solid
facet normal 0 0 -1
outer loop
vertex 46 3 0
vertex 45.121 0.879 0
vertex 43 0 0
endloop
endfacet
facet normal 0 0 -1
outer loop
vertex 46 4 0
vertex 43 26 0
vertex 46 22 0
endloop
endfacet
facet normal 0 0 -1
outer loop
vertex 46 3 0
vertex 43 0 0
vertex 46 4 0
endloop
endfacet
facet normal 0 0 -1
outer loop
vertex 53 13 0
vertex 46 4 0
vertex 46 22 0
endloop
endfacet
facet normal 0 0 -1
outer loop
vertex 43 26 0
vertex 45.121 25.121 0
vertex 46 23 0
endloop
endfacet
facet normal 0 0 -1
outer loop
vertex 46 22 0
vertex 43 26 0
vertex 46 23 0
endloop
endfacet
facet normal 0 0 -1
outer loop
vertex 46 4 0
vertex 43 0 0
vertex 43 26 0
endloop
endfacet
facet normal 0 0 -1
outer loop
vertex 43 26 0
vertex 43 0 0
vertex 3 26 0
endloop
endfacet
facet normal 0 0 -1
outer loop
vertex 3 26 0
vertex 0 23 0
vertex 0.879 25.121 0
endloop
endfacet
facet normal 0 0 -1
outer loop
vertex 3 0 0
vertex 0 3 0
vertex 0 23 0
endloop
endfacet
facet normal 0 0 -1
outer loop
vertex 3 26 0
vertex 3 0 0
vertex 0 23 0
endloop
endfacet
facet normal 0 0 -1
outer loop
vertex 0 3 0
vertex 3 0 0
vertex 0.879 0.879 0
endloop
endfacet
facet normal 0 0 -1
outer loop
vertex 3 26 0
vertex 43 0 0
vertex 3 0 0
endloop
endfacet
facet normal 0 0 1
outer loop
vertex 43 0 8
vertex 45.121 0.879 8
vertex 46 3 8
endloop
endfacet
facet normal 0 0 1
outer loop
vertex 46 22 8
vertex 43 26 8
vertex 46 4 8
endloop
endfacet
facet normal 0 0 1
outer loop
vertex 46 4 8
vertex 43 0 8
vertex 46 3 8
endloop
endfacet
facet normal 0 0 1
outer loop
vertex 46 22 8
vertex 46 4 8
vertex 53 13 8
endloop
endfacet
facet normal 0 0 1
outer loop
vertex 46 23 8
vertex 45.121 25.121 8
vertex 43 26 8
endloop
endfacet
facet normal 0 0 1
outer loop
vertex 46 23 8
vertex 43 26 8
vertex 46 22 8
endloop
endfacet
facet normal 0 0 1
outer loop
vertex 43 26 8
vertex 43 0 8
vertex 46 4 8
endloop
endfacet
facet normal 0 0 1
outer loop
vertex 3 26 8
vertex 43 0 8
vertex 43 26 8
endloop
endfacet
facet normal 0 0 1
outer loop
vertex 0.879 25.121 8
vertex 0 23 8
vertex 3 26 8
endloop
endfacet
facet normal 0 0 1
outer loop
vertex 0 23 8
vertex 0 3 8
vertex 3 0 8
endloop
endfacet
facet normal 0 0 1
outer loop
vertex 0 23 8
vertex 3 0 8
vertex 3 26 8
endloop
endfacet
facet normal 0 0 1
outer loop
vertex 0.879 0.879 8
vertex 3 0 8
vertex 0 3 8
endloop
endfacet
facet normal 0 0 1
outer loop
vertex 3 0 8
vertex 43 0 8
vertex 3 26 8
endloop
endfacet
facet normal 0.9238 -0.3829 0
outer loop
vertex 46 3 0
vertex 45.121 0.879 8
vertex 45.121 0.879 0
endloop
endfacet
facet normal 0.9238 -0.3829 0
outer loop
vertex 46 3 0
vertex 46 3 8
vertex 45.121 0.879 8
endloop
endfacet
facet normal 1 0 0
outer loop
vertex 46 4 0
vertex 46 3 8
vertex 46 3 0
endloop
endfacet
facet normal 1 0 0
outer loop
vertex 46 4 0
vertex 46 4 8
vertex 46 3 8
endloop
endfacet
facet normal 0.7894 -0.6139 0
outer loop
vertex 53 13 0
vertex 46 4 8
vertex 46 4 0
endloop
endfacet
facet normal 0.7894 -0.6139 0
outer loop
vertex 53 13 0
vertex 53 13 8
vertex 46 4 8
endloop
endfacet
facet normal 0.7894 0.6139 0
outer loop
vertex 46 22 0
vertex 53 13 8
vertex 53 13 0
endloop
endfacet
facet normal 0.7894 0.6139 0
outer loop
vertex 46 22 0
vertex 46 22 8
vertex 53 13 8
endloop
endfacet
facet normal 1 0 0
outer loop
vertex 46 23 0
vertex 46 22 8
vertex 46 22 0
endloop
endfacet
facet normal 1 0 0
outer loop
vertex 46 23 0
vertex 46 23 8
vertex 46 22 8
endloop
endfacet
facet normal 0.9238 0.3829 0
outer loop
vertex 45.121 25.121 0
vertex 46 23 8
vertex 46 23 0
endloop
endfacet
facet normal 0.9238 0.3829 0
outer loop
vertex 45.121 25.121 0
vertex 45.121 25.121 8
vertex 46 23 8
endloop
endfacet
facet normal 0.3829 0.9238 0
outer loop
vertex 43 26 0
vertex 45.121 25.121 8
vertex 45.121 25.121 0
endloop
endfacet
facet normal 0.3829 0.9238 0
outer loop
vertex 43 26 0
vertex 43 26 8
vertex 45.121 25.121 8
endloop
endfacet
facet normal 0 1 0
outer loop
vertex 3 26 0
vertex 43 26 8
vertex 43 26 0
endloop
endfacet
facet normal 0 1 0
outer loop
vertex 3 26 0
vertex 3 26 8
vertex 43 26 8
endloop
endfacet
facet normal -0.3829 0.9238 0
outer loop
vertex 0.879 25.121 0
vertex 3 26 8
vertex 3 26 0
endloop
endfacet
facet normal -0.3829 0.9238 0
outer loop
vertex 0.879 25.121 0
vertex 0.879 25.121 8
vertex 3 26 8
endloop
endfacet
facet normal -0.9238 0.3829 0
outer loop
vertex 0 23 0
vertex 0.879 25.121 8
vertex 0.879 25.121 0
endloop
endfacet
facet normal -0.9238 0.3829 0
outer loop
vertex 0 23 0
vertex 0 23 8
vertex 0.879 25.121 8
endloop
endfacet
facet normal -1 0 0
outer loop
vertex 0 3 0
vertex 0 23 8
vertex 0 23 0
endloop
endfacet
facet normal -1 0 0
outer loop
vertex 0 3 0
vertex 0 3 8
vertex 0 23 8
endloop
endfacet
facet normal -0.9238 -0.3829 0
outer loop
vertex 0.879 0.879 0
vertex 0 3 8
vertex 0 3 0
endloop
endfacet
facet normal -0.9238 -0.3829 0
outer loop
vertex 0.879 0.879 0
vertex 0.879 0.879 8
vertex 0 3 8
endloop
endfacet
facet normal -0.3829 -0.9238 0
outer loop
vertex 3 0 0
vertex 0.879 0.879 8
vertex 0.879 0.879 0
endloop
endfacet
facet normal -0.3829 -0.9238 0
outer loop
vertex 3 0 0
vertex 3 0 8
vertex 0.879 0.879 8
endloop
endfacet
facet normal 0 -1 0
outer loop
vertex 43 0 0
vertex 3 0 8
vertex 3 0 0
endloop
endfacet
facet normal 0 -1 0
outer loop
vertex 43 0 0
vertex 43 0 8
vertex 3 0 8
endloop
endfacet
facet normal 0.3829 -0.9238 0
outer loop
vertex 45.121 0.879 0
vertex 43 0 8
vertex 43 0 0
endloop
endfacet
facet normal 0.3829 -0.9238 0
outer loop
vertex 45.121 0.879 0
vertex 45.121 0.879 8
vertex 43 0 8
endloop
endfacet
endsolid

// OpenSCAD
$fn = 32;

// ----------------------------------------------------------------------
// Ratchet pawl: 46 x 26 mm body, beak 7 mm с правого торца
// ----------------------------------------------------------------------

// --- parameters (mm) ---
profile_height = 8;       // extrusion height
profile_points = 15;      // points of the closed outline

profile = [[0, 3], [0.879, 0.879], [3, 0], [43, 0], [45.121, 0.879], [46, 3], [46, 4], [53, 13], [46, 22], [46, 23], [45.121, 25.121], [43, 26], [3, 26], [0.879, 25.121], [0, 23]];  // single closed polygon, 15 points, counter clockwise

// --- the one profile operation ---
linear_extrude(height = profile_height) polygon(points = profile);
